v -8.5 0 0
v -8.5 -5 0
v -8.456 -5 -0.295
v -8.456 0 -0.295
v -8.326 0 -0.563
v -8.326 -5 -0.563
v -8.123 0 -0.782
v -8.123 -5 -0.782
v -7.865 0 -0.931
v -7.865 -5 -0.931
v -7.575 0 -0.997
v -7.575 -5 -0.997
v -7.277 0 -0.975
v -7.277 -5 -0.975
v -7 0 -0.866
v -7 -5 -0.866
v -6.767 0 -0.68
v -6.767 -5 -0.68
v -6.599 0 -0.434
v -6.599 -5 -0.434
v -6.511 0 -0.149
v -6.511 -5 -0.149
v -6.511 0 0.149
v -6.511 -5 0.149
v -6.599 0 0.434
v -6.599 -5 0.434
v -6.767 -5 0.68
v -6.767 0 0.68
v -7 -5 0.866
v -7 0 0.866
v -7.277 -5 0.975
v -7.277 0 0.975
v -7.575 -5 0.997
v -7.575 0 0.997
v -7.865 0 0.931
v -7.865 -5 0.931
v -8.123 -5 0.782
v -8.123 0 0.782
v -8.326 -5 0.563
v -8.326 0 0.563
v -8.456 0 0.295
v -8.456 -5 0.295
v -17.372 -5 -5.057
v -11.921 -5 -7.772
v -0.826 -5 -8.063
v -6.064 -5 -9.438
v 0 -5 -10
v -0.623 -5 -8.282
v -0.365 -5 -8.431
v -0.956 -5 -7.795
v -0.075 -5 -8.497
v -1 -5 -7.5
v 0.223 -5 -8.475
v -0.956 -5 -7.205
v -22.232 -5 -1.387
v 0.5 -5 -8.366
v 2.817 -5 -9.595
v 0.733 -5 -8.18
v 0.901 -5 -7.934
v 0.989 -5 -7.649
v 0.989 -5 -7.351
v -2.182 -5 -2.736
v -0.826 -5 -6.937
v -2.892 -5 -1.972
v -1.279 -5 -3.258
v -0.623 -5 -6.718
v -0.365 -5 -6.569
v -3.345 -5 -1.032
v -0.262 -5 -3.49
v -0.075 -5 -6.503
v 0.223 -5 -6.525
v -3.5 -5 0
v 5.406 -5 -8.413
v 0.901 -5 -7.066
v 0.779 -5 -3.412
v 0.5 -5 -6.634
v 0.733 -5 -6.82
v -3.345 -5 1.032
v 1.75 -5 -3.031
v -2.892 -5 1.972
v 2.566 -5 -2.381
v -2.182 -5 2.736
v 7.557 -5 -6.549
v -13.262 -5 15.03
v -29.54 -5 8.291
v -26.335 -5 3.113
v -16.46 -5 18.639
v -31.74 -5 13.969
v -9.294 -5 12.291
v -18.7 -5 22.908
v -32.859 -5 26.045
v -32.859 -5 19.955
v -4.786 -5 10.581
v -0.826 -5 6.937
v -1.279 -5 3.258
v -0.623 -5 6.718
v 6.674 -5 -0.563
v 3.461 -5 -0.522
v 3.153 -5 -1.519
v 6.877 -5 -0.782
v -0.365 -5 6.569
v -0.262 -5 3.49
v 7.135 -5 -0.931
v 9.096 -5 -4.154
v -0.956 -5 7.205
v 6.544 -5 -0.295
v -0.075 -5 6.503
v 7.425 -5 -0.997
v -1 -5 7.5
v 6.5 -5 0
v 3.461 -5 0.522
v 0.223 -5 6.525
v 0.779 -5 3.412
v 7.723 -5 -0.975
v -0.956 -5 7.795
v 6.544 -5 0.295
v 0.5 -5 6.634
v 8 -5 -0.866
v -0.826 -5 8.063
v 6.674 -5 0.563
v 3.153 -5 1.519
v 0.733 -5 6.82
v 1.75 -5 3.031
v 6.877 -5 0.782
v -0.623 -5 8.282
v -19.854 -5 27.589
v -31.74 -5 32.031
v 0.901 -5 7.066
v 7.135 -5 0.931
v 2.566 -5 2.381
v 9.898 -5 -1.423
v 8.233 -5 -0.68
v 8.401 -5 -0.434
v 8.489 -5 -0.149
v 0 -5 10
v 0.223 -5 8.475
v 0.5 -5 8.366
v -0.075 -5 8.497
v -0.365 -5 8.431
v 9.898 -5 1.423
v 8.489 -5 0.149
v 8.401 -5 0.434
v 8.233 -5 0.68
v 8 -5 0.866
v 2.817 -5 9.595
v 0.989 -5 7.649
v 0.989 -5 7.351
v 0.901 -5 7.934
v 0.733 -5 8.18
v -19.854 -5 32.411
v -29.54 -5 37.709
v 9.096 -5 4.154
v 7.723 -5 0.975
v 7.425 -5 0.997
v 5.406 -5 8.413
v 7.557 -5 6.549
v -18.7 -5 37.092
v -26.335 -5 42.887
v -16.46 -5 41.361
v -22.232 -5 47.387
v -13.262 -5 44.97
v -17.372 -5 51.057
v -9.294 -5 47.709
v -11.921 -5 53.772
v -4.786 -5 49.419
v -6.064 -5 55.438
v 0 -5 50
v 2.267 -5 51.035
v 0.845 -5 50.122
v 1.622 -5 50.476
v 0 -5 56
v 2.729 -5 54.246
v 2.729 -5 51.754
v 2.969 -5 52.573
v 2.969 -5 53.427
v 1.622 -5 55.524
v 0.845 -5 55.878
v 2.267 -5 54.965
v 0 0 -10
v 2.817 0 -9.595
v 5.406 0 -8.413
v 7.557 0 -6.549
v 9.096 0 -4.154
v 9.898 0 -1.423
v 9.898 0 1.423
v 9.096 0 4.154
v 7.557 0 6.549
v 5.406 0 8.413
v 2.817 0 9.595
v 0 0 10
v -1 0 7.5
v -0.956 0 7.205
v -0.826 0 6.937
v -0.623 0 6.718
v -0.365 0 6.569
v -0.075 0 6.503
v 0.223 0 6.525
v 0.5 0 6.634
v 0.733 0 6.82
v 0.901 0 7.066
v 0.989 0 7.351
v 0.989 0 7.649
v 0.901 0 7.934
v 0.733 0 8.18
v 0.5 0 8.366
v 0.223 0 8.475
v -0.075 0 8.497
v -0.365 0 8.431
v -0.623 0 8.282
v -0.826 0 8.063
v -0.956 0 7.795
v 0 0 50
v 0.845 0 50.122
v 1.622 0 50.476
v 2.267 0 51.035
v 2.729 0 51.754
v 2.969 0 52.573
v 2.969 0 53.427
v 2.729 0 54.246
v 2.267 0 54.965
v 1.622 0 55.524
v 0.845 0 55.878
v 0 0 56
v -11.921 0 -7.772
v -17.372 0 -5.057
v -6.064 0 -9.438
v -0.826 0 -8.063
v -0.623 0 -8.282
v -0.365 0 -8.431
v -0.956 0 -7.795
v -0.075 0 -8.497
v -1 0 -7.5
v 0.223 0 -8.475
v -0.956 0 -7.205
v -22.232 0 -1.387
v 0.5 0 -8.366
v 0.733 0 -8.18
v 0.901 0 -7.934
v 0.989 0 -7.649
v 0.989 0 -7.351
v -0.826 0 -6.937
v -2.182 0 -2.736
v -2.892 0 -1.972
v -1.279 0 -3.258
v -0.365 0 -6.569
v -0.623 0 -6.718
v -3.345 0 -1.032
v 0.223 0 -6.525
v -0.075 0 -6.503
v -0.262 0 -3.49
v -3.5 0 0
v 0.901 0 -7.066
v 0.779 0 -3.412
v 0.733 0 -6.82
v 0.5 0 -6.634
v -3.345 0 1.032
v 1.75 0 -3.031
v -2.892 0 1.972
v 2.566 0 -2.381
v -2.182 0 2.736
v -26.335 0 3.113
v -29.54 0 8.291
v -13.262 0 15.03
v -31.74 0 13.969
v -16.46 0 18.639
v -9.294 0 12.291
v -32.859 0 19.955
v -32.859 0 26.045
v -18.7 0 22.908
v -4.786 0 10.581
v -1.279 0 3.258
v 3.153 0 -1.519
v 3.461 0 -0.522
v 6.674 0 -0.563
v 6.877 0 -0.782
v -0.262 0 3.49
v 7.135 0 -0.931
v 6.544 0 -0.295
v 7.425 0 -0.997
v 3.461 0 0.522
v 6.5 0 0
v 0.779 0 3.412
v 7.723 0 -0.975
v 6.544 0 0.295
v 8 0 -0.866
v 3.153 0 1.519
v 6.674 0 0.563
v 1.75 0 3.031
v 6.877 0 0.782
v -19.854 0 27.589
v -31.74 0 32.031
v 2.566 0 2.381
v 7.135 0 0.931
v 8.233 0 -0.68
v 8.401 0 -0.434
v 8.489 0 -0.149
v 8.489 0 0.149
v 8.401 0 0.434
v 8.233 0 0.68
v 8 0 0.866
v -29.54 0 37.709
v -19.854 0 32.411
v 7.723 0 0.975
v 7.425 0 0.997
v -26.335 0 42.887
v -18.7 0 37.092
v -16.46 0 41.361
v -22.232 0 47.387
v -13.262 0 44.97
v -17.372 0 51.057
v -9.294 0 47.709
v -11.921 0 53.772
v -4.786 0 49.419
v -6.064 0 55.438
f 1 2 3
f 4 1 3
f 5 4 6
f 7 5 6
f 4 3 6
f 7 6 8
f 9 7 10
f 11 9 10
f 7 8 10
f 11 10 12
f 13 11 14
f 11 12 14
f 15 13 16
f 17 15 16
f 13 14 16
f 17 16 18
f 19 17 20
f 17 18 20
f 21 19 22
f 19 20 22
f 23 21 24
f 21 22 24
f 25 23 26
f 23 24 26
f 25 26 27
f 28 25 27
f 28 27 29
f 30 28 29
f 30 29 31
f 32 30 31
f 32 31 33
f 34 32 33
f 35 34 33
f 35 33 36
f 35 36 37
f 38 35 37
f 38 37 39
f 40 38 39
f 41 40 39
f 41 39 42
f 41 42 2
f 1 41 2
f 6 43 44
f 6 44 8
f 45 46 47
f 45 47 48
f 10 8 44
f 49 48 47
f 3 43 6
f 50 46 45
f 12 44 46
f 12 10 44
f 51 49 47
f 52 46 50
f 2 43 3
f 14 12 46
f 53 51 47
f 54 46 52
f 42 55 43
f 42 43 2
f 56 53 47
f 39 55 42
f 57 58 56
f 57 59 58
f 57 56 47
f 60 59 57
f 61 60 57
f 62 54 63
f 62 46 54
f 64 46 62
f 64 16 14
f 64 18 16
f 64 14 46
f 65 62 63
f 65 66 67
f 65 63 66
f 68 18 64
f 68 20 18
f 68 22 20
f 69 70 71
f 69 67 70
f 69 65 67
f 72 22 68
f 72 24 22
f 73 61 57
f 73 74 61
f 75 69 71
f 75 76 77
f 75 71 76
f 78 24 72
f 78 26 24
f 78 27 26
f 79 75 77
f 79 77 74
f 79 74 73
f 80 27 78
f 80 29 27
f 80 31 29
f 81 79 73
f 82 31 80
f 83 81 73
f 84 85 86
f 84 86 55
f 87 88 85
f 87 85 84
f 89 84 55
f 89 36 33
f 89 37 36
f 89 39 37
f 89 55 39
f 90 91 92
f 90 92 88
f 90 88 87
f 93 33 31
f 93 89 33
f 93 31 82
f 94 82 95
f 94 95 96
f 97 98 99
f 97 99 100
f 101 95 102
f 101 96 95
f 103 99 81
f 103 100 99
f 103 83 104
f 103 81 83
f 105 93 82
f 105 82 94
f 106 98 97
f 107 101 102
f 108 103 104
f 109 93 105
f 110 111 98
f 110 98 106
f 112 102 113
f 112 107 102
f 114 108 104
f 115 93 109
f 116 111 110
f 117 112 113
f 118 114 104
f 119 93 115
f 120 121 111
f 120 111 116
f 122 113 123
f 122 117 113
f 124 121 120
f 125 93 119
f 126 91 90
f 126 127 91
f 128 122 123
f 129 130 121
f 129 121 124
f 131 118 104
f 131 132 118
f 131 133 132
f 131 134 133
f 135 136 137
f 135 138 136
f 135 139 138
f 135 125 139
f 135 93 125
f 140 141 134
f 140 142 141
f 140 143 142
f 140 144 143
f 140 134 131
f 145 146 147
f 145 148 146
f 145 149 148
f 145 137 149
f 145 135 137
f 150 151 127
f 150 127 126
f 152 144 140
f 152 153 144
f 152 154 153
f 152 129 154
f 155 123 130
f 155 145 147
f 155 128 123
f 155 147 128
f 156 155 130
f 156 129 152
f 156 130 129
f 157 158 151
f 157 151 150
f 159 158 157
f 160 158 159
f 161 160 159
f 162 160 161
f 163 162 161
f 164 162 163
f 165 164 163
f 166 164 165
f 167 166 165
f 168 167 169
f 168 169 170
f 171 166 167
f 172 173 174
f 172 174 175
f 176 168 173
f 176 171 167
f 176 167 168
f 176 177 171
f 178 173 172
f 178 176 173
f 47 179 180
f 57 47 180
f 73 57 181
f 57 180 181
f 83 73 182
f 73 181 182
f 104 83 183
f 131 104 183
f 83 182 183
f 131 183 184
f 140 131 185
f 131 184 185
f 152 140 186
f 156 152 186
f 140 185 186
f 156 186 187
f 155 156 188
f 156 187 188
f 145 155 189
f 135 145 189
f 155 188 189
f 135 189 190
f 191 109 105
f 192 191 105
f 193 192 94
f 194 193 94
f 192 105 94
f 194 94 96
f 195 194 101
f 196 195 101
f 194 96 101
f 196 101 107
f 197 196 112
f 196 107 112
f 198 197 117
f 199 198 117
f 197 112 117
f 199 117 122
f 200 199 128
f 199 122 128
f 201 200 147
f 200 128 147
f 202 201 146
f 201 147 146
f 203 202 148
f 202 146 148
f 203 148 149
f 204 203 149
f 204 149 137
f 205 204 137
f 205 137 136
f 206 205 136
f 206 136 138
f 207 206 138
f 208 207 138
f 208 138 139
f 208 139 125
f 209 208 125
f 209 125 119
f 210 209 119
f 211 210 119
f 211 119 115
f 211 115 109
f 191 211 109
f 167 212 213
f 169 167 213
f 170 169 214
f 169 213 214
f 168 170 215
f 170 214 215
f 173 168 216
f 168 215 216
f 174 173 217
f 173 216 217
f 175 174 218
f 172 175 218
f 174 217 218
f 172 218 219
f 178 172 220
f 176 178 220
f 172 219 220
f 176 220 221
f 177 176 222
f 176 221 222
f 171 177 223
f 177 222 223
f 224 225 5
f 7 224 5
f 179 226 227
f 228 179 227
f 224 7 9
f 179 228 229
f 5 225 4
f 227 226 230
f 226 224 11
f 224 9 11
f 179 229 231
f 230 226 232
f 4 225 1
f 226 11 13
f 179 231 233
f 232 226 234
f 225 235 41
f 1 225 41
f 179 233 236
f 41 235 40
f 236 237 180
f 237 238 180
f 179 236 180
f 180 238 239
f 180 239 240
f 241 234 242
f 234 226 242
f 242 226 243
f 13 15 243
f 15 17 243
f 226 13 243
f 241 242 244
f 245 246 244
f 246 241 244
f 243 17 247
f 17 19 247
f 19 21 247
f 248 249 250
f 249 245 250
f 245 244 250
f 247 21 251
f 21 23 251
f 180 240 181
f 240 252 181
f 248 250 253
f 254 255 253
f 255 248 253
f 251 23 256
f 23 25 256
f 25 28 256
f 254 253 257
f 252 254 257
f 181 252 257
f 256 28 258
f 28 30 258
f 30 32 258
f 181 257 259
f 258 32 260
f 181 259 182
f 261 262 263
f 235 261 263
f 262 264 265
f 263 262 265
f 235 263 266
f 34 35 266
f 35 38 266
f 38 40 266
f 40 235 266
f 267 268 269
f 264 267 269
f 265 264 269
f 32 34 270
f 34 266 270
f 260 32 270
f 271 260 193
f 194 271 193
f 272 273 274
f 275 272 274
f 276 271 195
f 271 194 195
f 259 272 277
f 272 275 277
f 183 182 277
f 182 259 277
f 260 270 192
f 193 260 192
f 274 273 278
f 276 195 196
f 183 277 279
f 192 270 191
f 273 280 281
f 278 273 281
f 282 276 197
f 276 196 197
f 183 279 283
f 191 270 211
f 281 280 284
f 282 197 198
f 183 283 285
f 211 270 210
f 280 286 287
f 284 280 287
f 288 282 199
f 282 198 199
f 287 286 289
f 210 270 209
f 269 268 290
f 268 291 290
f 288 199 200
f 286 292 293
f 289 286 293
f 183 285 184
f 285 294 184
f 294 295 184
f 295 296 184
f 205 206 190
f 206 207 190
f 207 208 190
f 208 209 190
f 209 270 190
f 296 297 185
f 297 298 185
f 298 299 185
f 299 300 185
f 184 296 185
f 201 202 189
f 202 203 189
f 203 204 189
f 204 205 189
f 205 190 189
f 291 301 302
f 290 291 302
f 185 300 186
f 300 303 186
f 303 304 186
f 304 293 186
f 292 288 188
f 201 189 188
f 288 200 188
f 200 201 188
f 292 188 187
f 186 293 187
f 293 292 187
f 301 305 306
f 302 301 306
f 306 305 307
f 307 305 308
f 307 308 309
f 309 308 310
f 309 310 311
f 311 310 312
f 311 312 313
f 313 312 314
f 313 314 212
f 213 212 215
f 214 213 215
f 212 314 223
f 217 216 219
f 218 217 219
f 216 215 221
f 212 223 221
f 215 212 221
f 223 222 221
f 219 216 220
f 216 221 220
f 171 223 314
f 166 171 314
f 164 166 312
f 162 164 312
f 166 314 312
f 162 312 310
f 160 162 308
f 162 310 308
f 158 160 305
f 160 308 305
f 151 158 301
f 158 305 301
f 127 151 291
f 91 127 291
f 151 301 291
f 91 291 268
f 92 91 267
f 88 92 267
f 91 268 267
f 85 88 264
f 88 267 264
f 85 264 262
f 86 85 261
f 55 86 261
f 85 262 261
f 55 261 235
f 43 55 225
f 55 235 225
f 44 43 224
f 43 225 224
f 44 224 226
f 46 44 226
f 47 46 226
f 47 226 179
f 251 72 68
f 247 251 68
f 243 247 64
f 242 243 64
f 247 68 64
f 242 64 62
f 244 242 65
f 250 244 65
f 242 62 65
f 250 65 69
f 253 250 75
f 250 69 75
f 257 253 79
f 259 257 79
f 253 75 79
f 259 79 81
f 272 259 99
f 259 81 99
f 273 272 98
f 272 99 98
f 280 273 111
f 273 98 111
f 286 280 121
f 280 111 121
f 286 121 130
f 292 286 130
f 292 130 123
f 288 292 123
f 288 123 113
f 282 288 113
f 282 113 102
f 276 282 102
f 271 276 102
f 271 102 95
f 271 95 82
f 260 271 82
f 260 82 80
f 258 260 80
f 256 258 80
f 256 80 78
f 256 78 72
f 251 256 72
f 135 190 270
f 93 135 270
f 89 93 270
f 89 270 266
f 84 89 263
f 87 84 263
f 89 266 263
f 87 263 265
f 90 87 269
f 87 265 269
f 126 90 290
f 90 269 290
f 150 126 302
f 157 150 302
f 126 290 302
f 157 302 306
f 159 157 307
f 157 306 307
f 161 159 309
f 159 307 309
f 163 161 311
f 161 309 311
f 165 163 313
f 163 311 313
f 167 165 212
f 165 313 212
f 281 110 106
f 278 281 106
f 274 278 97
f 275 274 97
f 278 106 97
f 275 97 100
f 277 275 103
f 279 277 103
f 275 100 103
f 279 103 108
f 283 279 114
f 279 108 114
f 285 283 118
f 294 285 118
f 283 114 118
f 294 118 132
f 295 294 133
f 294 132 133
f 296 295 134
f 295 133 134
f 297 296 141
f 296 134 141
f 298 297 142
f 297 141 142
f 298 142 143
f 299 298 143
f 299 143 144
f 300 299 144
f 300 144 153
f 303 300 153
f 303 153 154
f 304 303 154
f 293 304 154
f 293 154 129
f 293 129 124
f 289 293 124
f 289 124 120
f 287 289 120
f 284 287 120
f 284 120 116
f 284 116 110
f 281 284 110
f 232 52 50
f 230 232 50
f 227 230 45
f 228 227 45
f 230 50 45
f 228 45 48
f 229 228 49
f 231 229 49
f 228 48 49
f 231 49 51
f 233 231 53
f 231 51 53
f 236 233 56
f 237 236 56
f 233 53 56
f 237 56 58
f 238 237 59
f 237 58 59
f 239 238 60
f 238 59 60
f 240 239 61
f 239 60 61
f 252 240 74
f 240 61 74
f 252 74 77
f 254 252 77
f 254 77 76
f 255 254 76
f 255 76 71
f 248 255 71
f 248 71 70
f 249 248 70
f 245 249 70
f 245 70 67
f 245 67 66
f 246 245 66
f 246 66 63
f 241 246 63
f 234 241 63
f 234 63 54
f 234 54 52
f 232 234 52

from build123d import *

# Parameters (mm, degrees)
F1_DEPTH = 5
F2_D     = 7
F3_D     = 2


with BuildPart() as f1:
    # F0 (on Front) → F1 (new body)
    with BuildSketch(Plane.XZ):
        with BuildLine():
            ThreePointArc((0, 56), (-33, 23), (0, -10))
            ThreePointArc((0, -10), (10, 0), (0, 10))
            ThreePointArc((0, 10), (-20, 30), (0, 50))
            ThreePointArc((0, 50), (3, 53), (0, 56))
        make_face()
    extrude(amount=F1_DEPTH)

    # F2 (through all)
    with Locations(Plane(origin=(0, 0, 0), x_dir=(1, 0, 0), z_dir=(0, 1, 0))):
        with Locations((0, 0)):
            Hole(F2_D / 2)

    # F3 (through all)
    with Locations(Plane(origin=(0, 0, 0), x_dir=(1, 0, 0), z_dir=(0, 1, 0))):
        with Locations((0, 7.5), (7.5, 0), (0, -7.5), (-7.5, 0)):
            Hole(F3_D / 2)


solid = f1.part
